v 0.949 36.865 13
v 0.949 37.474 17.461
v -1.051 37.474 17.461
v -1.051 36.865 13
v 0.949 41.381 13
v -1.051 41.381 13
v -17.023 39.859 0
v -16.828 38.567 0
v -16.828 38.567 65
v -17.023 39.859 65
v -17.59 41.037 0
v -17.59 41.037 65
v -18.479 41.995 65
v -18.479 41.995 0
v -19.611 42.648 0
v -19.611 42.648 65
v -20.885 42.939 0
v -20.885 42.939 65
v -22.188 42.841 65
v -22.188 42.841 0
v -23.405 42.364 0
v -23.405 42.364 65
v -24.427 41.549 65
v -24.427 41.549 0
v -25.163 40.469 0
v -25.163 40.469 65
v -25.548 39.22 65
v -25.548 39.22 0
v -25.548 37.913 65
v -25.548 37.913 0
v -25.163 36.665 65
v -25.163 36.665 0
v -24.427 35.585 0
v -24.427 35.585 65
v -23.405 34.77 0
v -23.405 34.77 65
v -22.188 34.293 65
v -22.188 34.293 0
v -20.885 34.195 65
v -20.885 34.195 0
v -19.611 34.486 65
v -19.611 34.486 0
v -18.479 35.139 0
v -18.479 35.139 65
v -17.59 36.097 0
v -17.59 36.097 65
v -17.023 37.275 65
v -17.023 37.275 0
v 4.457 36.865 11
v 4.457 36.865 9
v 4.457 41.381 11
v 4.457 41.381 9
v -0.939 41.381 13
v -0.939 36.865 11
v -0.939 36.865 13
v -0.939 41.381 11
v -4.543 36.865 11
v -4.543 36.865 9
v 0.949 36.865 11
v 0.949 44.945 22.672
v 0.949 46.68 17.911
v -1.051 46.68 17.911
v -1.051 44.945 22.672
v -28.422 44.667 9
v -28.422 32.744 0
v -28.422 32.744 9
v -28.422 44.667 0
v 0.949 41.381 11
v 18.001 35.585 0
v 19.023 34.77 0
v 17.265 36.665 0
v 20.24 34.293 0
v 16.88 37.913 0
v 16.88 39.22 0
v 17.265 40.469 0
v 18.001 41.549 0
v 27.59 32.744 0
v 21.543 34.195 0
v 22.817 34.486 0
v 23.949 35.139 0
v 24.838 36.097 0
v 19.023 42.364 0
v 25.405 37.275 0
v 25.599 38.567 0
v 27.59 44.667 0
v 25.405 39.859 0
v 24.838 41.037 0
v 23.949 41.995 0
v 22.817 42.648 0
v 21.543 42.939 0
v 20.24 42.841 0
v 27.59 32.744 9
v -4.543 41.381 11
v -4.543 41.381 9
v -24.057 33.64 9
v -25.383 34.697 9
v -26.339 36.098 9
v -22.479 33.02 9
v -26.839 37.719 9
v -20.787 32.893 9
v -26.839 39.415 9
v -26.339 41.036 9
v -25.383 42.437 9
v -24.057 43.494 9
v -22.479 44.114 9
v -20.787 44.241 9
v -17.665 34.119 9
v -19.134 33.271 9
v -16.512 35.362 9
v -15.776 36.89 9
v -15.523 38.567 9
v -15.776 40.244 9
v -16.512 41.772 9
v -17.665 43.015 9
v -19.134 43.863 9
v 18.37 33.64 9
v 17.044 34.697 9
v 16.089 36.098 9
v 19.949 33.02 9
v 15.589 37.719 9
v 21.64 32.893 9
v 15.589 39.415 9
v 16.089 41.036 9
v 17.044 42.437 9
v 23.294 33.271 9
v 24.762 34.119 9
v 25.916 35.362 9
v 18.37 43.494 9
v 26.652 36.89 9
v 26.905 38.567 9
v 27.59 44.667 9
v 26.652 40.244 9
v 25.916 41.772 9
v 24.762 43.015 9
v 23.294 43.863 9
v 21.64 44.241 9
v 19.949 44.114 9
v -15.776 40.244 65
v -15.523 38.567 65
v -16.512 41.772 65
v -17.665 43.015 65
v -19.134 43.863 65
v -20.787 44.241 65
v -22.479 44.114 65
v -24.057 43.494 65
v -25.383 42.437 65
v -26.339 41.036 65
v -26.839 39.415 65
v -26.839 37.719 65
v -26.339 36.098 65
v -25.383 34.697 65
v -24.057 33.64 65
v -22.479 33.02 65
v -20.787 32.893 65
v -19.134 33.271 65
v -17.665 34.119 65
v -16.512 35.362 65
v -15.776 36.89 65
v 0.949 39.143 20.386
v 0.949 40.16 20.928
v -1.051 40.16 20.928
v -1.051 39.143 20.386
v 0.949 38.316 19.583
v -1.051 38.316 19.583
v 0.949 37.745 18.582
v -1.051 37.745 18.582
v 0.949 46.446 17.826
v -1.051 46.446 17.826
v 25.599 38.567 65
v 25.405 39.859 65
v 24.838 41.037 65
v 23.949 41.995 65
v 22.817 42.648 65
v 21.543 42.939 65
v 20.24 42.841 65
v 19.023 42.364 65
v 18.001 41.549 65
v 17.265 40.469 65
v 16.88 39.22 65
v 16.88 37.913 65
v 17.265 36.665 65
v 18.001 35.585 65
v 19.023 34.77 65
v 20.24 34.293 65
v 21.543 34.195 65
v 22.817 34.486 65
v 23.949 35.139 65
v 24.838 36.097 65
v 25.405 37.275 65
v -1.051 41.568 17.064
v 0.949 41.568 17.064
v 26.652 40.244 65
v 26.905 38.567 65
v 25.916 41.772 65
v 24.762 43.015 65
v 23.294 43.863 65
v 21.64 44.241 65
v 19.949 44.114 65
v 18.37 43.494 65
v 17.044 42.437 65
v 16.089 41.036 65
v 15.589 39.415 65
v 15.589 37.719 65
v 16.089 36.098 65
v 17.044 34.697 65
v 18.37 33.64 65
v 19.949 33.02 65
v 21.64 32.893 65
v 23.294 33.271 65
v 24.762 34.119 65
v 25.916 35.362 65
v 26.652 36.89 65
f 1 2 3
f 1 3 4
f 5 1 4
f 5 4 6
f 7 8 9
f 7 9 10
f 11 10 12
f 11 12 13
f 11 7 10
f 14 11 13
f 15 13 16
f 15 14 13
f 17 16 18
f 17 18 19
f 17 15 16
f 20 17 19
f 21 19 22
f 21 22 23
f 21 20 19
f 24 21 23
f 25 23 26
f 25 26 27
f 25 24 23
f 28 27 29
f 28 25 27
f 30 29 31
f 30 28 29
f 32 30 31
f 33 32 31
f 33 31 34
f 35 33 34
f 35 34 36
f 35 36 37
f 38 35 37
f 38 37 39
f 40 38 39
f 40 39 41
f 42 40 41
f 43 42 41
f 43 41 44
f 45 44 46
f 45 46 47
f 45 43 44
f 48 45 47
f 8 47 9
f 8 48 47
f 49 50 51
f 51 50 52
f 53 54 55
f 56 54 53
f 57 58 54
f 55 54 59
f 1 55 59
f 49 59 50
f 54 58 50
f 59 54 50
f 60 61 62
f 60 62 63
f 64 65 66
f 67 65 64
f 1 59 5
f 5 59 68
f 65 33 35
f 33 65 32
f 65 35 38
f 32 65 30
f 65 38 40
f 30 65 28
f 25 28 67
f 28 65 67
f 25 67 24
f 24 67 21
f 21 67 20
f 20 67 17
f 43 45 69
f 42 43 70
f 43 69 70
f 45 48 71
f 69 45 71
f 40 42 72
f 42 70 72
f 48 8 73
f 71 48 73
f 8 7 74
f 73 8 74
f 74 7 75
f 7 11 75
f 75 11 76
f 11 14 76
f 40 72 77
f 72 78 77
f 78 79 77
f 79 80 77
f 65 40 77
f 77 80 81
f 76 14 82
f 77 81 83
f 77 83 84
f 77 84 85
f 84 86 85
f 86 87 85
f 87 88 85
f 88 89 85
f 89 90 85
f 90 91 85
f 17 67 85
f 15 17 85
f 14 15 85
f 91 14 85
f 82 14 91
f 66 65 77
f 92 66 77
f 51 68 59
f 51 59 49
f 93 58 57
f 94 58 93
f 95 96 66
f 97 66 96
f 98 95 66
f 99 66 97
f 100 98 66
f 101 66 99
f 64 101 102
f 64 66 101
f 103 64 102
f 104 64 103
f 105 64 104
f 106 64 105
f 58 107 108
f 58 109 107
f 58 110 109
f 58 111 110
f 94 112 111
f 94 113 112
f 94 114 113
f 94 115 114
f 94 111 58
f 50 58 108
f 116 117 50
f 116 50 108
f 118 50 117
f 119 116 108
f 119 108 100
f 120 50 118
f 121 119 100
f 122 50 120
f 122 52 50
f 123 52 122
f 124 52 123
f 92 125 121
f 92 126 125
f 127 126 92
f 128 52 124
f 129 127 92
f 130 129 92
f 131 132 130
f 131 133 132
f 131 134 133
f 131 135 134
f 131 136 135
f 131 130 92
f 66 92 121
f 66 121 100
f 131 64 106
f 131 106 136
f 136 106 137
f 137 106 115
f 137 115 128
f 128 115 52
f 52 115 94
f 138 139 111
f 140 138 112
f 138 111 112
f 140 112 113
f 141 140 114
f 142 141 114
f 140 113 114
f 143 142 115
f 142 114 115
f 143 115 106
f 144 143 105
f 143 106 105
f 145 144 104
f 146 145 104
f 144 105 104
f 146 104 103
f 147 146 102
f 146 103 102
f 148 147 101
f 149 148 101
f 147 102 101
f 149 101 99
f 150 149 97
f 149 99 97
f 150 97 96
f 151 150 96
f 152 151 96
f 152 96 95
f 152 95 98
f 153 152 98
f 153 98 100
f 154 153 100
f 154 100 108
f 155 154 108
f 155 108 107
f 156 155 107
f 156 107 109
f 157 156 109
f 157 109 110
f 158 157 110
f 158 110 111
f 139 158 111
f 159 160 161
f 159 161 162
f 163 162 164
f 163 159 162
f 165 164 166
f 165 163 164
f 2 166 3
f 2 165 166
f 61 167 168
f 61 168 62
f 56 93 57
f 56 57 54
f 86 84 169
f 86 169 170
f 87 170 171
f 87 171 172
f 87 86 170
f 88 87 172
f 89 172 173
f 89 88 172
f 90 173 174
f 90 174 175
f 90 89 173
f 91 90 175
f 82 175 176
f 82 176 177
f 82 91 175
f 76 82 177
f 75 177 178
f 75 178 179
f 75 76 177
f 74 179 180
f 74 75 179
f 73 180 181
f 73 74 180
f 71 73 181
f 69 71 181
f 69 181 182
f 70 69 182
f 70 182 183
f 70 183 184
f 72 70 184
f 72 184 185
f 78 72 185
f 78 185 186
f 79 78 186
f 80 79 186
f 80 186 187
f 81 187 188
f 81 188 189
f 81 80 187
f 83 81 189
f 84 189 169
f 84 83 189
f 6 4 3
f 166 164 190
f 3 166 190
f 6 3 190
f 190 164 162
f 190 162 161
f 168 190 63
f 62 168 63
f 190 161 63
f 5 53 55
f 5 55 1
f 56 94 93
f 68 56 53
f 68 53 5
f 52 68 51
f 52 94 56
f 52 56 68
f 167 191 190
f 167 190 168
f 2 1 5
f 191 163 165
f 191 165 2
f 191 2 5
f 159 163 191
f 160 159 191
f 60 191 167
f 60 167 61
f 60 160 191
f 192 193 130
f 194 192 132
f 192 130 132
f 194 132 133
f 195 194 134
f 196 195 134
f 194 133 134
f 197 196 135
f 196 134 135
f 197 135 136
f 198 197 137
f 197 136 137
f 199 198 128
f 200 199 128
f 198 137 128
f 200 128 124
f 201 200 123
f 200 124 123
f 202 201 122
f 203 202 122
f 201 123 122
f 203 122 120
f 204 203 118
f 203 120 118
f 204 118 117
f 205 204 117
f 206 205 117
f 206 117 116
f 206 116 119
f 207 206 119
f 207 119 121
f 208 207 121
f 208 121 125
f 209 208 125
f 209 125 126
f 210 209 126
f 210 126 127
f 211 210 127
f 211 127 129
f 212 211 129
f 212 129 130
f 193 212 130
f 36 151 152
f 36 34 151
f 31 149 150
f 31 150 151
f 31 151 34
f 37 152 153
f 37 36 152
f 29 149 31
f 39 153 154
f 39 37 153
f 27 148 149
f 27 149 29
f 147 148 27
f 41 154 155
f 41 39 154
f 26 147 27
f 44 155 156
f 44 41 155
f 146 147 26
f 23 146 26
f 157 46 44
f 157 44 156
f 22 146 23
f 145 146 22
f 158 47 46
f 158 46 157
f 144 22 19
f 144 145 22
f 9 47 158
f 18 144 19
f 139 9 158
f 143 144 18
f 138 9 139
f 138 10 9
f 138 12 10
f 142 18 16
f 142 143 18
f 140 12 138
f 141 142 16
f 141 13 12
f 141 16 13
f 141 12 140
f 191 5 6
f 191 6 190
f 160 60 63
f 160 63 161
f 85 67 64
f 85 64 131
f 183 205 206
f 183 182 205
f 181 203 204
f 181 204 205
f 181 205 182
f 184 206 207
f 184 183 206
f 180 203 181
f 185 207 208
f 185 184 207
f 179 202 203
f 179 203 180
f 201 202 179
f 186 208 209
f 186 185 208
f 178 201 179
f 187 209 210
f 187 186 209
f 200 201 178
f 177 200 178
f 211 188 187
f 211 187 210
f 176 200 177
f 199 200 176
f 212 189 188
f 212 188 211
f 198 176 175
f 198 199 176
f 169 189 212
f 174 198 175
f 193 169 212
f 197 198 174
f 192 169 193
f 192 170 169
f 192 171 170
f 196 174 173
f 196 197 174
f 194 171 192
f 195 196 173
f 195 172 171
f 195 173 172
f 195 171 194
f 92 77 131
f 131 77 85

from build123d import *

# Parameters (mm, degrees)
F0_R     = 5.6894885444
F0_R_2   = 4.3843175031
F1_DEPTH = 65
F0_W     = 56.0123268515
F0_H     = 11.923417449
F2_DEPTH = 9
F3_W     = 9.0000643395
F3_H     = 4.5161172748
F4_DEPTH = 2
F5_W     = 1.888447674
F5_H     = 4.5161172748
F6_DEPTH = 2
F8_DEPTH = 2


with BuildPart() as f1:
    # F0 (on Top) → F1 (new body)
    with BuildSketch(Plane.XY):
        with Locations((-21.2125875842, 38.5669283569)):
            Circle(F0_R)
        with Locations((-21.2125875842, 38.5669283569)):
            Circle(F0_R_2, mode=Mode.SUBTRACT)
    extrude(amount=F1_DEPTH)



with BuildPart() as f1b:
    # F0 (on Top) → F1, piece 2 (new body)
    with BuildSketch(Plane.XY):
        with Locations((21.215147819, 38.5669283569)):
            Circle(F0_R)
        with Locations((21.215147819, 38.5669283569)):
            Circle(F0_R_2, mode=Mode.SUBTRACT)
    extrude(amount=F1_DEPTH)


with BuildPart() as f1_1:
    add(f1.part)

    add(f1b.part)  # F2 merges F1b
    # F0 (on Top) → F2 (join)
    with BuildSketch(Plane.XY):
        with Locations((-0.4159319069, 38.7055762112)):
            Rectangle(F0_W, F0_H)
        with Locations((-21.2125875842, 38.5669283569)):
            Circle(F0_R, mode=Mode.SUBTRACT)
        with Locations((21.215147819, 38.5669283569)):
            Circle(F0_R, mode=Mode.SUBTRACT)
    extrude(amount=F2_DEPTH)

    # F3 (on face) → F4 (join)
    with BuildSketch(Plane.XY.offset(9)):
        with Locations((-0.0426771585, 39.1226857901)):
            Rectangle(F3_W, F3_H)
    extrude(amount=F4_DEPTH)

    # F5 (on face) → F6 (join)
    with BuildSketch(Plane.XY.offset(11)):
        with Locations((0.0049760565, 39.1226857901)):
            Rectangle(F5_W, F5_H)
    extrude(amount=F6_DEPTH)


with BuildPart() as f8:
    # F7 (on face) → F8 (new body)
    with BuildSketch(Plane.YZ.offset(0.9491998935)):
        with BuildLine():
            Line((37.4740036153, 17.461272415), (36.8646271527, 13))
            Line((36.8646271527, 13), (41.3807444274, 13))
            Line((41.3807444274, 13), (41.5678136051, 17.0637406409))
            Line((41.5678136051, 17.0637406409), (46.4460814167, 17.8263583901))
            Line((46.4460814167, 17.8263583901), (46.6797463596, 17.9114900529))
            Line((46.6797463596, 17.9114900529), (44.94539564, 22.6718453473))
            Line((44.94539564, 22.6718453473), (40.1598270518, 20.9283086128))
            ThreePointArc((40.1598270518, 20.9283086128), (38.3162714633, 19.5826263954), (37.4740036153, 17.461272415))
        make_face()
    extrude(amount=-F8_DEPTH)


solid = Compound([f1_1.part, f8.part])
